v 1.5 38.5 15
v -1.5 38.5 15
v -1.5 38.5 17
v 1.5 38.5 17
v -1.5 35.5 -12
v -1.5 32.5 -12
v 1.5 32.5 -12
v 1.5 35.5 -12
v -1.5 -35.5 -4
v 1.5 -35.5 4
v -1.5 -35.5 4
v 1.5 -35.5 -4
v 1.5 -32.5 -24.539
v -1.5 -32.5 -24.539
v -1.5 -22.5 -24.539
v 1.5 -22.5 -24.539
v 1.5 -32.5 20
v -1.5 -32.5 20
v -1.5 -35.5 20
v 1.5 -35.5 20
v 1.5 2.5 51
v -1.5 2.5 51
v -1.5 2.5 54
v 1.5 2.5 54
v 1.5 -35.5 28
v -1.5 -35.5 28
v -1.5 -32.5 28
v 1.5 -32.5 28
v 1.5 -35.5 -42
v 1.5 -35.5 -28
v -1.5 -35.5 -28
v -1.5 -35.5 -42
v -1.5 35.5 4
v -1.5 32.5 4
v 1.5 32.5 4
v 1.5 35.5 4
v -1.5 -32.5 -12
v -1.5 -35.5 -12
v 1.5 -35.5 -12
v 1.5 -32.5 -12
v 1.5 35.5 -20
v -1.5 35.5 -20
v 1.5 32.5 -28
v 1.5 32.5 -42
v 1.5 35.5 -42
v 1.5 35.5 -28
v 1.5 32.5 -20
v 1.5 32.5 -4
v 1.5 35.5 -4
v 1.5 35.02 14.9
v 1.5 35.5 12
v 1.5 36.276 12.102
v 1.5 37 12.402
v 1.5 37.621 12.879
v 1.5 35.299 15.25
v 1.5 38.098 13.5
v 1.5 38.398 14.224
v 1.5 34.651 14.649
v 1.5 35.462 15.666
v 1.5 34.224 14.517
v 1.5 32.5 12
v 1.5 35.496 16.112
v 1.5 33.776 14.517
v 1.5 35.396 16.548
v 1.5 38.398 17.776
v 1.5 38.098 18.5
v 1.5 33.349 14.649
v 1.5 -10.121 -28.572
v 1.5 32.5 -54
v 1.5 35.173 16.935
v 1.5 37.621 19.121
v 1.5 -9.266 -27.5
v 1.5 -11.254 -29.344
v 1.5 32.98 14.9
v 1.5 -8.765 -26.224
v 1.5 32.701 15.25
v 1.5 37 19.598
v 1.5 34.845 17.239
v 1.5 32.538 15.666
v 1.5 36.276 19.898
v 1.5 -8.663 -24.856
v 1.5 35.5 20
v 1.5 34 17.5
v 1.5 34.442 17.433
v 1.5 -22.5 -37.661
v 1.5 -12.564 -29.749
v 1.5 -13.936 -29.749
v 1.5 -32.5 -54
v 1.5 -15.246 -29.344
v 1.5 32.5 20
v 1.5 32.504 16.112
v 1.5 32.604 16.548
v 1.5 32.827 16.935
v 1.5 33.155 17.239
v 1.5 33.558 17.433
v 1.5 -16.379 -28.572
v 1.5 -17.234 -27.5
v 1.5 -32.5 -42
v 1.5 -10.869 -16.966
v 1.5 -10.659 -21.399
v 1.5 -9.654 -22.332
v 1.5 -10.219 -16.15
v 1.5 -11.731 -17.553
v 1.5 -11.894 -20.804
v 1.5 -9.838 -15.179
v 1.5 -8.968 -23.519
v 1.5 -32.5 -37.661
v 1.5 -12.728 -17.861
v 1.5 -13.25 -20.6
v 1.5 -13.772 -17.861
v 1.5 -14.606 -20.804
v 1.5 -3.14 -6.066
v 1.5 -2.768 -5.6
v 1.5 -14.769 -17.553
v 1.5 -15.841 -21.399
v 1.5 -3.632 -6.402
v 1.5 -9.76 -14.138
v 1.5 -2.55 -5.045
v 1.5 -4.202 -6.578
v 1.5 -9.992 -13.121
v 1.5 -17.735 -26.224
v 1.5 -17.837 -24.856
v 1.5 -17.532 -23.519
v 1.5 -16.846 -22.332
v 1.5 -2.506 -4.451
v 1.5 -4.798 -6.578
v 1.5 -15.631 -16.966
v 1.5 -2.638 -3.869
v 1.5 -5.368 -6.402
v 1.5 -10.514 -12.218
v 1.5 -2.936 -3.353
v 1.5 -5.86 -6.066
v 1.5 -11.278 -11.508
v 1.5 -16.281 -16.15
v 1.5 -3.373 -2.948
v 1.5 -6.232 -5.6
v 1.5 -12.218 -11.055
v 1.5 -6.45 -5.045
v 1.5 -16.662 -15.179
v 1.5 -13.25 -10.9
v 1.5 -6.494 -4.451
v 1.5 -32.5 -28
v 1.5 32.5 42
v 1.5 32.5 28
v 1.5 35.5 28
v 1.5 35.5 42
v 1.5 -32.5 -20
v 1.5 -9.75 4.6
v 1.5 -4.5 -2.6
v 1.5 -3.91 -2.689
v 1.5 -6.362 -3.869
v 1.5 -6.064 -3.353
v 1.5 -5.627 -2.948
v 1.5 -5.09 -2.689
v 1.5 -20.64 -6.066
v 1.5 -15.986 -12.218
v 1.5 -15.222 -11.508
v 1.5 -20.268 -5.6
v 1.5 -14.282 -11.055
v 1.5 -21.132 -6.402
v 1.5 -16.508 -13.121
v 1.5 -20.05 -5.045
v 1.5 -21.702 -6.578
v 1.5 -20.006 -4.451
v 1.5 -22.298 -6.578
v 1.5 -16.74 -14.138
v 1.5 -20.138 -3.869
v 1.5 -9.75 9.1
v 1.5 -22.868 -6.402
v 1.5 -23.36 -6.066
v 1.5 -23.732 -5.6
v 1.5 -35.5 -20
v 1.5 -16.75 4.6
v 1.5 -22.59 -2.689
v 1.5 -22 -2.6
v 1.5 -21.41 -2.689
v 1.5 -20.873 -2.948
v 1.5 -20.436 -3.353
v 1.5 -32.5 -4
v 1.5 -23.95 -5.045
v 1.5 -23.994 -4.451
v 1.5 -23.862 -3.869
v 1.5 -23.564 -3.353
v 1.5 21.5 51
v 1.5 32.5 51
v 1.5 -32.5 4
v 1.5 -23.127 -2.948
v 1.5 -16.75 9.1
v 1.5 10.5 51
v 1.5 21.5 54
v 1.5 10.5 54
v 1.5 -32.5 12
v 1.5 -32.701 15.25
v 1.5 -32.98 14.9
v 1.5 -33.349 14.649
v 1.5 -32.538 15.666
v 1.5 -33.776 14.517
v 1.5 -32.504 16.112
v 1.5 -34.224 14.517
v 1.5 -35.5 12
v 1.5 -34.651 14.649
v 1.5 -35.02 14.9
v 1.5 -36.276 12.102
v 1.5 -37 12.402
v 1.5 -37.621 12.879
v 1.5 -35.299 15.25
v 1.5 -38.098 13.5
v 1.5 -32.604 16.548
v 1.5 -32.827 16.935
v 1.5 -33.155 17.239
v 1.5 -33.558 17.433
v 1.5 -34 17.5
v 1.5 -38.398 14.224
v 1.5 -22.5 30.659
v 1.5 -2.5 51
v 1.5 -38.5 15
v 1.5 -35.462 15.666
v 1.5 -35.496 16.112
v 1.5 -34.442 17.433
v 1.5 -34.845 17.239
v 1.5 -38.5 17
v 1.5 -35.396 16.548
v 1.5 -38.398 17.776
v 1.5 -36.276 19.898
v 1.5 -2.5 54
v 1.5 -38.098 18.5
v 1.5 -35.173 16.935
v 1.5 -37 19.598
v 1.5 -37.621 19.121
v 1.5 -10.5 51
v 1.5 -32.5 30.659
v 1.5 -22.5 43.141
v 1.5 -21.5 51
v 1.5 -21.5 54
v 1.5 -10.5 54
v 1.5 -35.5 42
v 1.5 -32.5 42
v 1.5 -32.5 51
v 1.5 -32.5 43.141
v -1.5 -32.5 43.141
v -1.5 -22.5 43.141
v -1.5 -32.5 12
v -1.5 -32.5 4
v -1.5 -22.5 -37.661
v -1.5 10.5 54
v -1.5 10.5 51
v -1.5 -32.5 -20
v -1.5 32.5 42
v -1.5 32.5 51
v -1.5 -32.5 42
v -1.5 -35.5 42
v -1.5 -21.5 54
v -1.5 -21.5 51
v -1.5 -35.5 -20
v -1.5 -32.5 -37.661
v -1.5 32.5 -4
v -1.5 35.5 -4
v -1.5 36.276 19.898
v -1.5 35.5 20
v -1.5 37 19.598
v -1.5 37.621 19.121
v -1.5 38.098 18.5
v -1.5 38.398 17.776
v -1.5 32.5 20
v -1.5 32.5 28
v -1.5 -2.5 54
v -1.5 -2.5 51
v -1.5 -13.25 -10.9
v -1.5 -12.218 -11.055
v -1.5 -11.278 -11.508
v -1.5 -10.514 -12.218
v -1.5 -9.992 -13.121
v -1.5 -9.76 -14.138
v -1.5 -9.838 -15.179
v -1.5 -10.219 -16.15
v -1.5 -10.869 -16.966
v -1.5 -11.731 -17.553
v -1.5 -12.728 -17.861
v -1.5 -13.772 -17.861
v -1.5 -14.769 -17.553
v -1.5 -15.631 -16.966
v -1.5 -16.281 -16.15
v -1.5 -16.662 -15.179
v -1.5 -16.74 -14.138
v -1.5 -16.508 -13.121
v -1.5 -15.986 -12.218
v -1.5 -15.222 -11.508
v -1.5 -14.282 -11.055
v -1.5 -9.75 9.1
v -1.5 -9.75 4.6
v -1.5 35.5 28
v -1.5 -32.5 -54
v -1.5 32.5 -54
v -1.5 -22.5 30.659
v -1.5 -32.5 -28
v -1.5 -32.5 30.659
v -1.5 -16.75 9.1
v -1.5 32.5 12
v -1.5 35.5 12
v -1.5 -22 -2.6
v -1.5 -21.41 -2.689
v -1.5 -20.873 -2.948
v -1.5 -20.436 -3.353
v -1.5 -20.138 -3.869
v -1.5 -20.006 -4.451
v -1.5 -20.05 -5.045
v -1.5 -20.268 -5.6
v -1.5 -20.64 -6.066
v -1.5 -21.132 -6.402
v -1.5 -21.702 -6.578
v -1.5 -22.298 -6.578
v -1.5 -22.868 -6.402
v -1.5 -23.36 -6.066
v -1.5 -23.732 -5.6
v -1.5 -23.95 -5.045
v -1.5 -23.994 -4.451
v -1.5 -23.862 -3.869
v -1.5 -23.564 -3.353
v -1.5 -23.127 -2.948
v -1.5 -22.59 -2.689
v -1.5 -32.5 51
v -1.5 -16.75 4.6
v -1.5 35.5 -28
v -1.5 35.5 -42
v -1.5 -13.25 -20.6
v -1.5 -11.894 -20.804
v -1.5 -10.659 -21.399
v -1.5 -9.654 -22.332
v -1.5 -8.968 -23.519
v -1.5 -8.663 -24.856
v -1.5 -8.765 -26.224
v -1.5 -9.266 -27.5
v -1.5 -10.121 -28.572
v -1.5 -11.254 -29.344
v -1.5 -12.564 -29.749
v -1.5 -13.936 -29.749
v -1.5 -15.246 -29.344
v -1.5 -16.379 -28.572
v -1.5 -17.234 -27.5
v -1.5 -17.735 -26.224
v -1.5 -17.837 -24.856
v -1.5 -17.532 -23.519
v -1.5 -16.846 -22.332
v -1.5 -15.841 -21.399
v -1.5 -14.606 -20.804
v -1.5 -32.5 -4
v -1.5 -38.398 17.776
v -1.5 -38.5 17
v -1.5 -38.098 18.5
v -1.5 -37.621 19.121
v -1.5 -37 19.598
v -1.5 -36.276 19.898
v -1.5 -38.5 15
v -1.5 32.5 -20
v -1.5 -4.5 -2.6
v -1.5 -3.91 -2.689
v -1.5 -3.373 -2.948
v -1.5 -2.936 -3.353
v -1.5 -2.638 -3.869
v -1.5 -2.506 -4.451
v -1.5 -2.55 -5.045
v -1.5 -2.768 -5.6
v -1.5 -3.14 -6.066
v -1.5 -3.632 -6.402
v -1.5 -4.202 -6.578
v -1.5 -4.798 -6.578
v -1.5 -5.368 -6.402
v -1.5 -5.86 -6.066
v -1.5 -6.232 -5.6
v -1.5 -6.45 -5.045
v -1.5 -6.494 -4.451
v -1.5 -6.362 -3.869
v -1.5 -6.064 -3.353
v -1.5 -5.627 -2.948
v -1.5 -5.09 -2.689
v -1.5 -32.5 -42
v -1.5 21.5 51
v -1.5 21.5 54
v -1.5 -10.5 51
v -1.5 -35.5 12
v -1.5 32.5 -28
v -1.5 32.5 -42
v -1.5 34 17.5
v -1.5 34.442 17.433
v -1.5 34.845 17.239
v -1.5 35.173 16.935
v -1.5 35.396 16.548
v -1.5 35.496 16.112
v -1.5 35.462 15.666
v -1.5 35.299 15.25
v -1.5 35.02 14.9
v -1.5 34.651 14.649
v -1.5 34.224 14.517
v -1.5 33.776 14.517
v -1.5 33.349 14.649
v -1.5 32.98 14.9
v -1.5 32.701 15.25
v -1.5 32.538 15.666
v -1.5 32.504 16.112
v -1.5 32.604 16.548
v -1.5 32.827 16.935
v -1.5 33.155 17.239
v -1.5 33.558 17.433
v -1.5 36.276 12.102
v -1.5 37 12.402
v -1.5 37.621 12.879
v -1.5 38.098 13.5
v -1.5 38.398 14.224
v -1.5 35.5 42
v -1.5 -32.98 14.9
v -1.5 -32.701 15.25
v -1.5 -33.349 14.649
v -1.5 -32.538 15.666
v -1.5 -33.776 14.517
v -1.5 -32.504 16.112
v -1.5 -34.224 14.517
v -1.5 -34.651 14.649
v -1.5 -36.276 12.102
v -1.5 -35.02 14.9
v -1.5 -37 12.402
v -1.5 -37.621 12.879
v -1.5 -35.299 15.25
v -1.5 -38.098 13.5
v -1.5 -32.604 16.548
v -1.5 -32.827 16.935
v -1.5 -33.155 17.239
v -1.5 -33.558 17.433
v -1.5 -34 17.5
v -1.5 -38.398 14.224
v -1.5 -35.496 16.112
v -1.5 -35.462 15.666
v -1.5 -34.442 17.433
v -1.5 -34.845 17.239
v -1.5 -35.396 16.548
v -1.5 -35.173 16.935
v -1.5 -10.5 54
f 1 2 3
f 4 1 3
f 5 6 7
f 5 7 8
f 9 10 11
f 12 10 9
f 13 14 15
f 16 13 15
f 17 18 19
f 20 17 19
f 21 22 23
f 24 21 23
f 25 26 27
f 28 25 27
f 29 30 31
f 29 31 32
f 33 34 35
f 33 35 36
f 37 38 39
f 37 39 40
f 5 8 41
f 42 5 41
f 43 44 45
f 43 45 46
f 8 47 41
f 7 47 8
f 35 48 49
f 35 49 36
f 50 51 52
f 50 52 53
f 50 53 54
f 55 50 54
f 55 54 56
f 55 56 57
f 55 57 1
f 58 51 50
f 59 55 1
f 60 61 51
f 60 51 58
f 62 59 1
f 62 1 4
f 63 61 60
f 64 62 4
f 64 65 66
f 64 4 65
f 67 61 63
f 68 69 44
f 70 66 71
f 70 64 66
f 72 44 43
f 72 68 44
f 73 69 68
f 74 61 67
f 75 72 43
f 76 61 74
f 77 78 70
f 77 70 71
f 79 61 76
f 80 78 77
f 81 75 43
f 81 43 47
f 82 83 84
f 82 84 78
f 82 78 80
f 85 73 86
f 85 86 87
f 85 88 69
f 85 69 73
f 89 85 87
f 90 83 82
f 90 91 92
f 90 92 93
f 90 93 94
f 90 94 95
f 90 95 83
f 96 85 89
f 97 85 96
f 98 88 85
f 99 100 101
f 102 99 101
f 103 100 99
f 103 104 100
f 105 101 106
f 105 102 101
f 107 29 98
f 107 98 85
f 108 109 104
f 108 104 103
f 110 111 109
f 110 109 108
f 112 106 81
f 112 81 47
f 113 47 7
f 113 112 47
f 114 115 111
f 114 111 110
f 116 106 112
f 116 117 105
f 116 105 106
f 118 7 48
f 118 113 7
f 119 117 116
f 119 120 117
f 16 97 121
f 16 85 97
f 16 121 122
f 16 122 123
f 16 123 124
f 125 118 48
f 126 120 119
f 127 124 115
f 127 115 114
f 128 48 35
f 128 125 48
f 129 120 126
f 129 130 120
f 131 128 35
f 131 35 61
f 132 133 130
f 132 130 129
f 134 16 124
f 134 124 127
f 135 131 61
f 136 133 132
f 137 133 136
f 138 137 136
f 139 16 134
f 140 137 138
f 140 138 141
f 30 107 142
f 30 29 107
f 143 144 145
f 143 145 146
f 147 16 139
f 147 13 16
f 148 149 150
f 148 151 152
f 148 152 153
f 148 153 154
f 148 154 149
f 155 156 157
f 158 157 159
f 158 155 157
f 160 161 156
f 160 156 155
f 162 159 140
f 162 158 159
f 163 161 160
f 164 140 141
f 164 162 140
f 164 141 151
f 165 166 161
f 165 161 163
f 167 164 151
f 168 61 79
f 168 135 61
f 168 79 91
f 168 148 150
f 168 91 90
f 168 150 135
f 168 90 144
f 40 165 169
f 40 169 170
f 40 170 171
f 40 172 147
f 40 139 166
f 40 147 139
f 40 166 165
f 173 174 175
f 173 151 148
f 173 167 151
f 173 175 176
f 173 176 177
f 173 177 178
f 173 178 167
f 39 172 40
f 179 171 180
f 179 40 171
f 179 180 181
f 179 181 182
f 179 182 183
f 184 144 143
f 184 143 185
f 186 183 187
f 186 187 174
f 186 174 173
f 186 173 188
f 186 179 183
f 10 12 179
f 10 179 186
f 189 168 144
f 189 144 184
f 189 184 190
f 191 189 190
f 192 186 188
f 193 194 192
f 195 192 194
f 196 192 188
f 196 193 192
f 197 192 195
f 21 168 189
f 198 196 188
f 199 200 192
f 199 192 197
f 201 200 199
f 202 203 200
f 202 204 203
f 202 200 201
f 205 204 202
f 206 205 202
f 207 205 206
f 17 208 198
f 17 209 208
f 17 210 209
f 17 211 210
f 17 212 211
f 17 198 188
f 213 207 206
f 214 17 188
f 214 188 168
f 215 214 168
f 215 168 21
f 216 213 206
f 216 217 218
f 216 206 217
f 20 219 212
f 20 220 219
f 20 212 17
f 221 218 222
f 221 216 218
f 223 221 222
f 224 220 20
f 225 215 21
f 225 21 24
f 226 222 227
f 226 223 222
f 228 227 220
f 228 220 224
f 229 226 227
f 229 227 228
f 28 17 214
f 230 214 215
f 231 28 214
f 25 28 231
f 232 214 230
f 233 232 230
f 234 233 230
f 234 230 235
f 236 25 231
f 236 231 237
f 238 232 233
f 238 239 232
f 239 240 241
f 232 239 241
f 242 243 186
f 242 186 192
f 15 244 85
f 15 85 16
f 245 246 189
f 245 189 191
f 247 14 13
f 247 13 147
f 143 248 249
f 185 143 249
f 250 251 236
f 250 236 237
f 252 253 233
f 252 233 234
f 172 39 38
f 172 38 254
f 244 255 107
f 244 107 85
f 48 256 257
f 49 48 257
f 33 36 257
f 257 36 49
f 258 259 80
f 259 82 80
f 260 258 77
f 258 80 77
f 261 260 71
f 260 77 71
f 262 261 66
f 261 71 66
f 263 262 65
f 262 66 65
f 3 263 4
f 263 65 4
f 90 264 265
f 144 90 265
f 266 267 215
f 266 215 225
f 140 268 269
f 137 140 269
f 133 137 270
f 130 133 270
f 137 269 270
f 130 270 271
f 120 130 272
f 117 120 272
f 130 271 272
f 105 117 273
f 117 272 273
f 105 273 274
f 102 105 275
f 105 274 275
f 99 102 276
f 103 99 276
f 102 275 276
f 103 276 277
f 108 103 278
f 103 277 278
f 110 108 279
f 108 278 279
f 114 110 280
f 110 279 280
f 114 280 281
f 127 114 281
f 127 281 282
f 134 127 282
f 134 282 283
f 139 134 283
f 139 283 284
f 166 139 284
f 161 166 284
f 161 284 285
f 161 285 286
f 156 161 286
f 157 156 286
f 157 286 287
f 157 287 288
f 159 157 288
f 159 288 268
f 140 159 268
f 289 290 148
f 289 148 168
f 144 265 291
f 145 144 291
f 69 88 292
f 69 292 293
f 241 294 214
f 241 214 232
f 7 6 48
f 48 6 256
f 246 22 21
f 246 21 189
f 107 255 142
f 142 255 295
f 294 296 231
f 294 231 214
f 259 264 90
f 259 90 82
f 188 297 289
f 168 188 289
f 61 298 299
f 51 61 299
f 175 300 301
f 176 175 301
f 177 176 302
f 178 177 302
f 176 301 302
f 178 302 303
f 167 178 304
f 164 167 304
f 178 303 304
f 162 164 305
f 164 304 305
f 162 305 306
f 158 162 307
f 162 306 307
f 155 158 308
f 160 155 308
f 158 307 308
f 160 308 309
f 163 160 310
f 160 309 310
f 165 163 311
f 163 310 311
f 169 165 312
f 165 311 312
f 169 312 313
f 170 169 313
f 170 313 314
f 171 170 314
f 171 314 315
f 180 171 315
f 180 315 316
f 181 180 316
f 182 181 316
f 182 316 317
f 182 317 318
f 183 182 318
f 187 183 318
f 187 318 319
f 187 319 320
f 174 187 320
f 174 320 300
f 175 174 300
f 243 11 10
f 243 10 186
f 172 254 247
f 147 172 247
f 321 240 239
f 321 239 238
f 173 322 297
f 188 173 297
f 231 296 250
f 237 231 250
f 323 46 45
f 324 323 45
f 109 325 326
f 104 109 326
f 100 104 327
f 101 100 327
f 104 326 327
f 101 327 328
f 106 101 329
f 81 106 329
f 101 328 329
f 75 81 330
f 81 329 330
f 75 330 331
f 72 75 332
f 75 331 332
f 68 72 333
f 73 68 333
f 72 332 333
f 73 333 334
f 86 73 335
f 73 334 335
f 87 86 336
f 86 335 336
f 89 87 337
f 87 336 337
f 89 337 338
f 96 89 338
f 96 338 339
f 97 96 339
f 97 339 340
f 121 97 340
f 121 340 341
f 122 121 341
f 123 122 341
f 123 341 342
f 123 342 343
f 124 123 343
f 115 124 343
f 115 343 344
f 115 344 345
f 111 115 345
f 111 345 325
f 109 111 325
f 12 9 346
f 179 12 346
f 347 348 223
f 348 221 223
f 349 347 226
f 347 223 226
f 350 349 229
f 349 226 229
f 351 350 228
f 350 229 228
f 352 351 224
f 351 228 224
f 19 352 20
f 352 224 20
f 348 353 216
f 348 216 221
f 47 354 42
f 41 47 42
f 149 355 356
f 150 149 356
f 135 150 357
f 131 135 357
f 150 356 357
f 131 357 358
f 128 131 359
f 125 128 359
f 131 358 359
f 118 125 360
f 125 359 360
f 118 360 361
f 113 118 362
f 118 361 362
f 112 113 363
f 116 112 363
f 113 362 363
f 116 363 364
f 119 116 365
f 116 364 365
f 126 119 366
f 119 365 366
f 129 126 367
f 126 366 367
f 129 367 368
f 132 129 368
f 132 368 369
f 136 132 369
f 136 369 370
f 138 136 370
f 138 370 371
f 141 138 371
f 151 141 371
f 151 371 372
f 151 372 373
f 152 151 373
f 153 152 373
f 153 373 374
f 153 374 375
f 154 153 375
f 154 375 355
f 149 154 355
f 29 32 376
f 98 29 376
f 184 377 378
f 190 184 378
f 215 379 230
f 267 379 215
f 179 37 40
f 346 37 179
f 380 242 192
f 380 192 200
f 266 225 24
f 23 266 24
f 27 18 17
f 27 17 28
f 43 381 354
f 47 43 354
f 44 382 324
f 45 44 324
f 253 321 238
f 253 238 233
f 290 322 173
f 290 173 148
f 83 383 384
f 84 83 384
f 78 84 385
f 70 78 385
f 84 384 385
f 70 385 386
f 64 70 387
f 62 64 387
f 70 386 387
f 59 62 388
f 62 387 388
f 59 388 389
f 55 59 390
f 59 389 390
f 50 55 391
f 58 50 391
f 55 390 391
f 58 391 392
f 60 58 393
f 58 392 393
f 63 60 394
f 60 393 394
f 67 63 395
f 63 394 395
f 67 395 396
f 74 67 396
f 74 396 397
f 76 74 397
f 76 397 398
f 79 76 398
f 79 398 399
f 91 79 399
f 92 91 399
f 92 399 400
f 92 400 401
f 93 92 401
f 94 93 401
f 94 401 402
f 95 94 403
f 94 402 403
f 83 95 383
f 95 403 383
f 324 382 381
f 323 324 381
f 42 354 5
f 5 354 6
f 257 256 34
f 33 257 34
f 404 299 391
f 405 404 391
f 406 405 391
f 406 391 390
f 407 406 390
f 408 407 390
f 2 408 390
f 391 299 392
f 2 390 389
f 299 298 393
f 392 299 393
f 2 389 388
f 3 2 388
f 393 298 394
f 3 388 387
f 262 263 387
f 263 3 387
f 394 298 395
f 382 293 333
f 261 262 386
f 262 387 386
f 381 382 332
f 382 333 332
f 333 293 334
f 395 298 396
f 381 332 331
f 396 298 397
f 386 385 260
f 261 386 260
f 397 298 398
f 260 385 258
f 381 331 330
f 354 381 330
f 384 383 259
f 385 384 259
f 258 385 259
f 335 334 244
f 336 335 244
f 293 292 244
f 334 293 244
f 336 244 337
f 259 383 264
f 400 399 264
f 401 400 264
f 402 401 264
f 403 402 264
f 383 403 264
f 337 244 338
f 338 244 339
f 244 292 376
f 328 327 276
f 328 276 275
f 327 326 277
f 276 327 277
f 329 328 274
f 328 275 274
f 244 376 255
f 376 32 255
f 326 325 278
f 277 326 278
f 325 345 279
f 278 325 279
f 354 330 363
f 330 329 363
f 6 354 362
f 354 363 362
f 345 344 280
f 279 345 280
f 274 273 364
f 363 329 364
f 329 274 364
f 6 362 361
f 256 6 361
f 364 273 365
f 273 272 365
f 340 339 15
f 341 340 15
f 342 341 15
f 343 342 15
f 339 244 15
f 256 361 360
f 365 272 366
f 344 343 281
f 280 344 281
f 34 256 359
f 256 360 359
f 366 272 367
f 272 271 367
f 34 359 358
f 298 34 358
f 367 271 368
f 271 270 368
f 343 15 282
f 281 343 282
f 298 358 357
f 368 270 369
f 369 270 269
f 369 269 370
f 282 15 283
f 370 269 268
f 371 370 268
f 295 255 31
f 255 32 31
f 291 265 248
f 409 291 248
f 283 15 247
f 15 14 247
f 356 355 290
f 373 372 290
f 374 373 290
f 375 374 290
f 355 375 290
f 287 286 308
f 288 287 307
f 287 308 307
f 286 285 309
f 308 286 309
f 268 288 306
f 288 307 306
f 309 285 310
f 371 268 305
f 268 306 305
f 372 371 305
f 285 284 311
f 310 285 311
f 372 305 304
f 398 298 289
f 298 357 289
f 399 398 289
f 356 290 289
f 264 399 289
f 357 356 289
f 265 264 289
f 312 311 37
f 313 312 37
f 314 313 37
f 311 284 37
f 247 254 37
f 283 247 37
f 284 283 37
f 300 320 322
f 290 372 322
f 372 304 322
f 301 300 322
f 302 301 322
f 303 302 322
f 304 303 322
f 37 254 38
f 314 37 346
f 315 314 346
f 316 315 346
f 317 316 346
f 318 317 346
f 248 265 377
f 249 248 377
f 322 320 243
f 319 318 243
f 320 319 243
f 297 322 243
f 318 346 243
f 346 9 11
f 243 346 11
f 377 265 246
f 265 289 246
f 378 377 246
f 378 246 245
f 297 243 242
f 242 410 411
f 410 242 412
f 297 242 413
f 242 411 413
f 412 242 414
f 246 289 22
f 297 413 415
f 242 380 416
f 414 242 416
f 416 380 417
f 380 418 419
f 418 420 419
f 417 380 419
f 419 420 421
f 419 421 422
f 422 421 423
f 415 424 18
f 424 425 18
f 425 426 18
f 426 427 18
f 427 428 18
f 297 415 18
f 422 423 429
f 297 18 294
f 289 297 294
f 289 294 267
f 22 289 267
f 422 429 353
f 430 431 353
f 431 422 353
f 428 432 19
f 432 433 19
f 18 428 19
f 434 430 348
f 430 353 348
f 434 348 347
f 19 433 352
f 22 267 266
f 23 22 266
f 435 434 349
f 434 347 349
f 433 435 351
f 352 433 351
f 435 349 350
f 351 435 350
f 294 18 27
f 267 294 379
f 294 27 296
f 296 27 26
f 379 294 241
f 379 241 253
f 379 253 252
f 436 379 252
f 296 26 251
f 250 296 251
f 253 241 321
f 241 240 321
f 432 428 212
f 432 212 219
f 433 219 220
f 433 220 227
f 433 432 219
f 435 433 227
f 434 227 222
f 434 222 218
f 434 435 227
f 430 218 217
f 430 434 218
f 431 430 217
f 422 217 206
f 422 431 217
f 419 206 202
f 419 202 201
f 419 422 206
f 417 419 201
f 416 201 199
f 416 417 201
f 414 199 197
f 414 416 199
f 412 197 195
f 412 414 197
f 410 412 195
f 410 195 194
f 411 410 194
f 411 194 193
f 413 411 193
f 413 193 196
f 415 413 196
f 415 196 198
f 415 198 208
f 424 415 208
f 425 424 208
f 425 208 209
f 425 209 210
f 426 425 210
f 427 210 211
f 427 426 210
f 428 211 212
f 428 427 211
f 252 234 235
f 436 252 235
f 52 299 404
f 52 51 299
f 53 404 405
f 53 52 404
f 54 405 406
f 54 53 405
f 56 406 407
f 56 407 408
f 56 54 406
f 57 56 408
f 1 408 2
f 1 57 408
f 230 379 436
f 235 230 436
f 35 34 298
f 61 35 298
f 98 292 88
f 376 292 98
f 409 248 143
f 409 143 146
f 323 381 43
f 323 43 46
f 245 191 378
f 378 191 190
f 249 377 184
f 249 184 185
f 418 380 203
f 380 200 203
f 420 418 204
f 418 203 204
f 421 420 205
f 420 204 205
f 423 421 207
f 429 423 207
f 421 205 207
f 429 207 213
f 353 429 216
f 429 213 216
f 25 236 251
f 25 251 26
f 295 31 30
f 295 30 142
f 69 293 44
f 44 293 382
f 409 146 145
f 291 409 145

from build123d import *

# Parameters (mm, degrees)
CROQUIS1_W               = 108
CROQUIS1_H               = 71
SALIENTE_EXTRUIR1_DEPTH  = 1.5
CROQUIS2_W               = 12
CROQUIS2_H               = 3
CROQUIS2_W_2             = 8
CORTAR_EXTRUIR1_DEPTH    = 3
CROQUIS6_W               = 3
CROQUIS6_H               = 14
CROQUIS6_H_2             = 8
CORTAR_EXTRUIR3_DEPTH    = 3
CROQUIS8_W               = 8
CROQUIS8_H               = 3
SALIENTE_EXTRUIR2_DEPTH  = 3
REDONDEO2_R              = 3
CROQUIS9_R               = 1.5
CORTAR_EXTRUIR5_DEPTH    = 3
REDONDEO2_OF_SIMETR_A1_R = 3
CROQUIS10_R              = 4.6
CROQUIS10_R_2            = 3.5
CROQUIS10_R_3            = 2
CROQUIS10_W              = 4.5
CROQUIS10_H              = 7
CORTAR_EXTRUIR6_DEPTH    = 10
CROQUIS12_W              = 13.122983438
CROQUIS12_H              = 10
CROQUIS12_W_2            = 12.481361742
CORTAR_EXTRUIR7_DEPTH    = 10


with BuildPart() as part:
    # Croquis1 → Saliente-Extruir1 (new, symmetric)
    with BuildSketch(Plane(origin=(0, 0, 0), x_dir=(0, 0, -1), z_dir=(1, 0, 0))):
        Rectangle(CROQUIS1_W, CROQUIS1_H)
    extrude(amount=SALIENTE_EXTRUIR1_DEPTH, both=True)

    # Croquis2 → Cortar-Extruir1 (cut)
    with BuildSketch(Plane.ZY.offset(1.5)):
        with Locations((-48, -34)):
            Rectangle(CROQUIS2_W, CROQUIS2_H)
        with Locations((-24, -34)):
            Rectangle(CROQUIS2_W_2, CROQUIS2_H)
        with Locations((-8, -34)):
            Rectangle(CROQUIS2_W_2, CROQUIS2_H)
        with Locations((8, -34)):
            Rectangle(CROQUIS2_W_2, CROQUIS2_H)
        with Locations((24, -34)):
            Rectangle(CROQUIS2_W_2, CROQUIS2_H)
        with Locations((48, -34)):
            Rectangle(CROQUIS2_W, CROQUIS2_H)
        with Locations((48, 34)):
            Rectangle(CROQUIS2_W, CROQUIS2_H)
        with Locations((24, 34)):
            Rectangle(CROQUIS2_W_2, CROQUIS2_H)
        with Locations((8, 34)):
            Rectangle(CROQUIS2_W_2, CROQUIS2_H)
        with Locations((-8, 34)):
            Rectangle(CROQUIS2_W_2, CROQUIS2_H)
        with Locations((-24, 34)):
            Rectangle(CROQUIS2_W_2, CROQUIS2_H)
        with Locations((-48, 34)):
            Rectangle(CROQUIS2_W, CROQUIS2_H)
    extrude(amount=-CORTAR_EXTRUIR1_DEPTH, mode=Mode.SUBTRACT)

    # Croquis6 → Cortar-Extruir3 (cut)
    with BuildSketch(Plane.ZY.offset(1.5)):
        with Locations((52.5, -28.5)):
            Rectangle(CROQUIS6_W, CROQUIS6_H)
        with Locations((52.5, -6.5)):
            Rectangle(CROQUIS6_W, CROQUIS6_H_2)
        with Locations((52.5, 6.5)):
            Rectangle(CROQUIS6_W, CROQUIS6_H_2)
        with Locations((52.5, 28.5)):
            Rectangle(CROQUIS6_W, CROQUIS6_H)
    extrude(amount=-CORTAR_EXTRUIR3_DEPTH, mode=Mode.SUBTRACT)

    # Croquis8 → Saliente-Extruir2 (add)
    with BuildSketch(Plane.ZY.offset(1.5)):
        with Locations((16, 37)):
            Rectangle(CROQUIS8_W, CROQUIS8_H)
    saliente_extruir2 = extrude(amount=-SALIENTE_EXTRUIR2_DEPTH)

    # Redondeo2
    redondeo2_edges = [part.edges().sort_by_distance(p)[0] for p in [
        (0, 38.5, 12),
        (0, 38.5, 20),
    ]]
    fillet(redondeo2_edges, radius=REDONDEO2_R)

    # Croquis9 → Cortar-Extruir5 (cut)
    with BuildSketch(Plane.ZY.offset(1.5)):
        with Locations((16, 34)):
            Circle(CROQUIS9_R)
    cortar_extruir5 = extrude(amount=-CORTAR_EXTRUIR5_DEPTH, mode=Mode.SUBTRACT)

    # Simetría1: Saliente-Extruir2, Cortar-Extruir5 across plane
    add(saliente_extruir2.mirror(Plane.ZX))
    add(cortar_extruir5.mirror(Plane.ZX), mode=Mode.SUBTRACT)

    # Redondeo2 of Simetría1
    redondeo2_of_simetr_a1_edges = [part.edges().sort_by_distance(p)[0] for p in [
        (0, -38.5, 12),
        (0, -38.5, 20),
    ]]
    fillet(redondeo2_of_simetr_a1_edges, radius=REDONDEO2_OF_SIMETR_A1_R)

    # Croquis10 → Cortar-Extruir6 (cut)
    with BuildSketch(Plane.ZY.offset(1.5)):
        with Locations((-25.2, -13.25)):
            Circle(CROQUIS10_R)
        with Locations((-14.4, -13.25)):
            Circle(CROQUIS10_R_2)
        with Locations((-4.6, -22)):
            Circle(CROQUIS10_R_3)
        with Locations((-4.6, -4.5)):
            Circle(CROQUIS10_R_3)
        with Locations((6.85, -13.25)):
            Rectangle(CROQUIS10_W, CROQUIS10_H)
    extrude(amount=-CORTAR_EXTRUIR6_DEPTH, mode=Mode.SUBTRACT)

    # Croquis12 → Cortar-Extruir7 (cut)
    with BuildSketch(Plane.ZY.offset(1.5)):
        with Locations((-31.1, -27.5)):
            Rectangle(CROQUIS12_W, CROQUIS12_H)
        with Locations((36.9, -27.5)):
            Rectangle(CROQUIS12_W_2, CROQUIS12_H)
    extrude(amount=-CORTAR_EXTRUIR7_DEPTH, mode=Mode.SUBTRACT)


solid = part.part
